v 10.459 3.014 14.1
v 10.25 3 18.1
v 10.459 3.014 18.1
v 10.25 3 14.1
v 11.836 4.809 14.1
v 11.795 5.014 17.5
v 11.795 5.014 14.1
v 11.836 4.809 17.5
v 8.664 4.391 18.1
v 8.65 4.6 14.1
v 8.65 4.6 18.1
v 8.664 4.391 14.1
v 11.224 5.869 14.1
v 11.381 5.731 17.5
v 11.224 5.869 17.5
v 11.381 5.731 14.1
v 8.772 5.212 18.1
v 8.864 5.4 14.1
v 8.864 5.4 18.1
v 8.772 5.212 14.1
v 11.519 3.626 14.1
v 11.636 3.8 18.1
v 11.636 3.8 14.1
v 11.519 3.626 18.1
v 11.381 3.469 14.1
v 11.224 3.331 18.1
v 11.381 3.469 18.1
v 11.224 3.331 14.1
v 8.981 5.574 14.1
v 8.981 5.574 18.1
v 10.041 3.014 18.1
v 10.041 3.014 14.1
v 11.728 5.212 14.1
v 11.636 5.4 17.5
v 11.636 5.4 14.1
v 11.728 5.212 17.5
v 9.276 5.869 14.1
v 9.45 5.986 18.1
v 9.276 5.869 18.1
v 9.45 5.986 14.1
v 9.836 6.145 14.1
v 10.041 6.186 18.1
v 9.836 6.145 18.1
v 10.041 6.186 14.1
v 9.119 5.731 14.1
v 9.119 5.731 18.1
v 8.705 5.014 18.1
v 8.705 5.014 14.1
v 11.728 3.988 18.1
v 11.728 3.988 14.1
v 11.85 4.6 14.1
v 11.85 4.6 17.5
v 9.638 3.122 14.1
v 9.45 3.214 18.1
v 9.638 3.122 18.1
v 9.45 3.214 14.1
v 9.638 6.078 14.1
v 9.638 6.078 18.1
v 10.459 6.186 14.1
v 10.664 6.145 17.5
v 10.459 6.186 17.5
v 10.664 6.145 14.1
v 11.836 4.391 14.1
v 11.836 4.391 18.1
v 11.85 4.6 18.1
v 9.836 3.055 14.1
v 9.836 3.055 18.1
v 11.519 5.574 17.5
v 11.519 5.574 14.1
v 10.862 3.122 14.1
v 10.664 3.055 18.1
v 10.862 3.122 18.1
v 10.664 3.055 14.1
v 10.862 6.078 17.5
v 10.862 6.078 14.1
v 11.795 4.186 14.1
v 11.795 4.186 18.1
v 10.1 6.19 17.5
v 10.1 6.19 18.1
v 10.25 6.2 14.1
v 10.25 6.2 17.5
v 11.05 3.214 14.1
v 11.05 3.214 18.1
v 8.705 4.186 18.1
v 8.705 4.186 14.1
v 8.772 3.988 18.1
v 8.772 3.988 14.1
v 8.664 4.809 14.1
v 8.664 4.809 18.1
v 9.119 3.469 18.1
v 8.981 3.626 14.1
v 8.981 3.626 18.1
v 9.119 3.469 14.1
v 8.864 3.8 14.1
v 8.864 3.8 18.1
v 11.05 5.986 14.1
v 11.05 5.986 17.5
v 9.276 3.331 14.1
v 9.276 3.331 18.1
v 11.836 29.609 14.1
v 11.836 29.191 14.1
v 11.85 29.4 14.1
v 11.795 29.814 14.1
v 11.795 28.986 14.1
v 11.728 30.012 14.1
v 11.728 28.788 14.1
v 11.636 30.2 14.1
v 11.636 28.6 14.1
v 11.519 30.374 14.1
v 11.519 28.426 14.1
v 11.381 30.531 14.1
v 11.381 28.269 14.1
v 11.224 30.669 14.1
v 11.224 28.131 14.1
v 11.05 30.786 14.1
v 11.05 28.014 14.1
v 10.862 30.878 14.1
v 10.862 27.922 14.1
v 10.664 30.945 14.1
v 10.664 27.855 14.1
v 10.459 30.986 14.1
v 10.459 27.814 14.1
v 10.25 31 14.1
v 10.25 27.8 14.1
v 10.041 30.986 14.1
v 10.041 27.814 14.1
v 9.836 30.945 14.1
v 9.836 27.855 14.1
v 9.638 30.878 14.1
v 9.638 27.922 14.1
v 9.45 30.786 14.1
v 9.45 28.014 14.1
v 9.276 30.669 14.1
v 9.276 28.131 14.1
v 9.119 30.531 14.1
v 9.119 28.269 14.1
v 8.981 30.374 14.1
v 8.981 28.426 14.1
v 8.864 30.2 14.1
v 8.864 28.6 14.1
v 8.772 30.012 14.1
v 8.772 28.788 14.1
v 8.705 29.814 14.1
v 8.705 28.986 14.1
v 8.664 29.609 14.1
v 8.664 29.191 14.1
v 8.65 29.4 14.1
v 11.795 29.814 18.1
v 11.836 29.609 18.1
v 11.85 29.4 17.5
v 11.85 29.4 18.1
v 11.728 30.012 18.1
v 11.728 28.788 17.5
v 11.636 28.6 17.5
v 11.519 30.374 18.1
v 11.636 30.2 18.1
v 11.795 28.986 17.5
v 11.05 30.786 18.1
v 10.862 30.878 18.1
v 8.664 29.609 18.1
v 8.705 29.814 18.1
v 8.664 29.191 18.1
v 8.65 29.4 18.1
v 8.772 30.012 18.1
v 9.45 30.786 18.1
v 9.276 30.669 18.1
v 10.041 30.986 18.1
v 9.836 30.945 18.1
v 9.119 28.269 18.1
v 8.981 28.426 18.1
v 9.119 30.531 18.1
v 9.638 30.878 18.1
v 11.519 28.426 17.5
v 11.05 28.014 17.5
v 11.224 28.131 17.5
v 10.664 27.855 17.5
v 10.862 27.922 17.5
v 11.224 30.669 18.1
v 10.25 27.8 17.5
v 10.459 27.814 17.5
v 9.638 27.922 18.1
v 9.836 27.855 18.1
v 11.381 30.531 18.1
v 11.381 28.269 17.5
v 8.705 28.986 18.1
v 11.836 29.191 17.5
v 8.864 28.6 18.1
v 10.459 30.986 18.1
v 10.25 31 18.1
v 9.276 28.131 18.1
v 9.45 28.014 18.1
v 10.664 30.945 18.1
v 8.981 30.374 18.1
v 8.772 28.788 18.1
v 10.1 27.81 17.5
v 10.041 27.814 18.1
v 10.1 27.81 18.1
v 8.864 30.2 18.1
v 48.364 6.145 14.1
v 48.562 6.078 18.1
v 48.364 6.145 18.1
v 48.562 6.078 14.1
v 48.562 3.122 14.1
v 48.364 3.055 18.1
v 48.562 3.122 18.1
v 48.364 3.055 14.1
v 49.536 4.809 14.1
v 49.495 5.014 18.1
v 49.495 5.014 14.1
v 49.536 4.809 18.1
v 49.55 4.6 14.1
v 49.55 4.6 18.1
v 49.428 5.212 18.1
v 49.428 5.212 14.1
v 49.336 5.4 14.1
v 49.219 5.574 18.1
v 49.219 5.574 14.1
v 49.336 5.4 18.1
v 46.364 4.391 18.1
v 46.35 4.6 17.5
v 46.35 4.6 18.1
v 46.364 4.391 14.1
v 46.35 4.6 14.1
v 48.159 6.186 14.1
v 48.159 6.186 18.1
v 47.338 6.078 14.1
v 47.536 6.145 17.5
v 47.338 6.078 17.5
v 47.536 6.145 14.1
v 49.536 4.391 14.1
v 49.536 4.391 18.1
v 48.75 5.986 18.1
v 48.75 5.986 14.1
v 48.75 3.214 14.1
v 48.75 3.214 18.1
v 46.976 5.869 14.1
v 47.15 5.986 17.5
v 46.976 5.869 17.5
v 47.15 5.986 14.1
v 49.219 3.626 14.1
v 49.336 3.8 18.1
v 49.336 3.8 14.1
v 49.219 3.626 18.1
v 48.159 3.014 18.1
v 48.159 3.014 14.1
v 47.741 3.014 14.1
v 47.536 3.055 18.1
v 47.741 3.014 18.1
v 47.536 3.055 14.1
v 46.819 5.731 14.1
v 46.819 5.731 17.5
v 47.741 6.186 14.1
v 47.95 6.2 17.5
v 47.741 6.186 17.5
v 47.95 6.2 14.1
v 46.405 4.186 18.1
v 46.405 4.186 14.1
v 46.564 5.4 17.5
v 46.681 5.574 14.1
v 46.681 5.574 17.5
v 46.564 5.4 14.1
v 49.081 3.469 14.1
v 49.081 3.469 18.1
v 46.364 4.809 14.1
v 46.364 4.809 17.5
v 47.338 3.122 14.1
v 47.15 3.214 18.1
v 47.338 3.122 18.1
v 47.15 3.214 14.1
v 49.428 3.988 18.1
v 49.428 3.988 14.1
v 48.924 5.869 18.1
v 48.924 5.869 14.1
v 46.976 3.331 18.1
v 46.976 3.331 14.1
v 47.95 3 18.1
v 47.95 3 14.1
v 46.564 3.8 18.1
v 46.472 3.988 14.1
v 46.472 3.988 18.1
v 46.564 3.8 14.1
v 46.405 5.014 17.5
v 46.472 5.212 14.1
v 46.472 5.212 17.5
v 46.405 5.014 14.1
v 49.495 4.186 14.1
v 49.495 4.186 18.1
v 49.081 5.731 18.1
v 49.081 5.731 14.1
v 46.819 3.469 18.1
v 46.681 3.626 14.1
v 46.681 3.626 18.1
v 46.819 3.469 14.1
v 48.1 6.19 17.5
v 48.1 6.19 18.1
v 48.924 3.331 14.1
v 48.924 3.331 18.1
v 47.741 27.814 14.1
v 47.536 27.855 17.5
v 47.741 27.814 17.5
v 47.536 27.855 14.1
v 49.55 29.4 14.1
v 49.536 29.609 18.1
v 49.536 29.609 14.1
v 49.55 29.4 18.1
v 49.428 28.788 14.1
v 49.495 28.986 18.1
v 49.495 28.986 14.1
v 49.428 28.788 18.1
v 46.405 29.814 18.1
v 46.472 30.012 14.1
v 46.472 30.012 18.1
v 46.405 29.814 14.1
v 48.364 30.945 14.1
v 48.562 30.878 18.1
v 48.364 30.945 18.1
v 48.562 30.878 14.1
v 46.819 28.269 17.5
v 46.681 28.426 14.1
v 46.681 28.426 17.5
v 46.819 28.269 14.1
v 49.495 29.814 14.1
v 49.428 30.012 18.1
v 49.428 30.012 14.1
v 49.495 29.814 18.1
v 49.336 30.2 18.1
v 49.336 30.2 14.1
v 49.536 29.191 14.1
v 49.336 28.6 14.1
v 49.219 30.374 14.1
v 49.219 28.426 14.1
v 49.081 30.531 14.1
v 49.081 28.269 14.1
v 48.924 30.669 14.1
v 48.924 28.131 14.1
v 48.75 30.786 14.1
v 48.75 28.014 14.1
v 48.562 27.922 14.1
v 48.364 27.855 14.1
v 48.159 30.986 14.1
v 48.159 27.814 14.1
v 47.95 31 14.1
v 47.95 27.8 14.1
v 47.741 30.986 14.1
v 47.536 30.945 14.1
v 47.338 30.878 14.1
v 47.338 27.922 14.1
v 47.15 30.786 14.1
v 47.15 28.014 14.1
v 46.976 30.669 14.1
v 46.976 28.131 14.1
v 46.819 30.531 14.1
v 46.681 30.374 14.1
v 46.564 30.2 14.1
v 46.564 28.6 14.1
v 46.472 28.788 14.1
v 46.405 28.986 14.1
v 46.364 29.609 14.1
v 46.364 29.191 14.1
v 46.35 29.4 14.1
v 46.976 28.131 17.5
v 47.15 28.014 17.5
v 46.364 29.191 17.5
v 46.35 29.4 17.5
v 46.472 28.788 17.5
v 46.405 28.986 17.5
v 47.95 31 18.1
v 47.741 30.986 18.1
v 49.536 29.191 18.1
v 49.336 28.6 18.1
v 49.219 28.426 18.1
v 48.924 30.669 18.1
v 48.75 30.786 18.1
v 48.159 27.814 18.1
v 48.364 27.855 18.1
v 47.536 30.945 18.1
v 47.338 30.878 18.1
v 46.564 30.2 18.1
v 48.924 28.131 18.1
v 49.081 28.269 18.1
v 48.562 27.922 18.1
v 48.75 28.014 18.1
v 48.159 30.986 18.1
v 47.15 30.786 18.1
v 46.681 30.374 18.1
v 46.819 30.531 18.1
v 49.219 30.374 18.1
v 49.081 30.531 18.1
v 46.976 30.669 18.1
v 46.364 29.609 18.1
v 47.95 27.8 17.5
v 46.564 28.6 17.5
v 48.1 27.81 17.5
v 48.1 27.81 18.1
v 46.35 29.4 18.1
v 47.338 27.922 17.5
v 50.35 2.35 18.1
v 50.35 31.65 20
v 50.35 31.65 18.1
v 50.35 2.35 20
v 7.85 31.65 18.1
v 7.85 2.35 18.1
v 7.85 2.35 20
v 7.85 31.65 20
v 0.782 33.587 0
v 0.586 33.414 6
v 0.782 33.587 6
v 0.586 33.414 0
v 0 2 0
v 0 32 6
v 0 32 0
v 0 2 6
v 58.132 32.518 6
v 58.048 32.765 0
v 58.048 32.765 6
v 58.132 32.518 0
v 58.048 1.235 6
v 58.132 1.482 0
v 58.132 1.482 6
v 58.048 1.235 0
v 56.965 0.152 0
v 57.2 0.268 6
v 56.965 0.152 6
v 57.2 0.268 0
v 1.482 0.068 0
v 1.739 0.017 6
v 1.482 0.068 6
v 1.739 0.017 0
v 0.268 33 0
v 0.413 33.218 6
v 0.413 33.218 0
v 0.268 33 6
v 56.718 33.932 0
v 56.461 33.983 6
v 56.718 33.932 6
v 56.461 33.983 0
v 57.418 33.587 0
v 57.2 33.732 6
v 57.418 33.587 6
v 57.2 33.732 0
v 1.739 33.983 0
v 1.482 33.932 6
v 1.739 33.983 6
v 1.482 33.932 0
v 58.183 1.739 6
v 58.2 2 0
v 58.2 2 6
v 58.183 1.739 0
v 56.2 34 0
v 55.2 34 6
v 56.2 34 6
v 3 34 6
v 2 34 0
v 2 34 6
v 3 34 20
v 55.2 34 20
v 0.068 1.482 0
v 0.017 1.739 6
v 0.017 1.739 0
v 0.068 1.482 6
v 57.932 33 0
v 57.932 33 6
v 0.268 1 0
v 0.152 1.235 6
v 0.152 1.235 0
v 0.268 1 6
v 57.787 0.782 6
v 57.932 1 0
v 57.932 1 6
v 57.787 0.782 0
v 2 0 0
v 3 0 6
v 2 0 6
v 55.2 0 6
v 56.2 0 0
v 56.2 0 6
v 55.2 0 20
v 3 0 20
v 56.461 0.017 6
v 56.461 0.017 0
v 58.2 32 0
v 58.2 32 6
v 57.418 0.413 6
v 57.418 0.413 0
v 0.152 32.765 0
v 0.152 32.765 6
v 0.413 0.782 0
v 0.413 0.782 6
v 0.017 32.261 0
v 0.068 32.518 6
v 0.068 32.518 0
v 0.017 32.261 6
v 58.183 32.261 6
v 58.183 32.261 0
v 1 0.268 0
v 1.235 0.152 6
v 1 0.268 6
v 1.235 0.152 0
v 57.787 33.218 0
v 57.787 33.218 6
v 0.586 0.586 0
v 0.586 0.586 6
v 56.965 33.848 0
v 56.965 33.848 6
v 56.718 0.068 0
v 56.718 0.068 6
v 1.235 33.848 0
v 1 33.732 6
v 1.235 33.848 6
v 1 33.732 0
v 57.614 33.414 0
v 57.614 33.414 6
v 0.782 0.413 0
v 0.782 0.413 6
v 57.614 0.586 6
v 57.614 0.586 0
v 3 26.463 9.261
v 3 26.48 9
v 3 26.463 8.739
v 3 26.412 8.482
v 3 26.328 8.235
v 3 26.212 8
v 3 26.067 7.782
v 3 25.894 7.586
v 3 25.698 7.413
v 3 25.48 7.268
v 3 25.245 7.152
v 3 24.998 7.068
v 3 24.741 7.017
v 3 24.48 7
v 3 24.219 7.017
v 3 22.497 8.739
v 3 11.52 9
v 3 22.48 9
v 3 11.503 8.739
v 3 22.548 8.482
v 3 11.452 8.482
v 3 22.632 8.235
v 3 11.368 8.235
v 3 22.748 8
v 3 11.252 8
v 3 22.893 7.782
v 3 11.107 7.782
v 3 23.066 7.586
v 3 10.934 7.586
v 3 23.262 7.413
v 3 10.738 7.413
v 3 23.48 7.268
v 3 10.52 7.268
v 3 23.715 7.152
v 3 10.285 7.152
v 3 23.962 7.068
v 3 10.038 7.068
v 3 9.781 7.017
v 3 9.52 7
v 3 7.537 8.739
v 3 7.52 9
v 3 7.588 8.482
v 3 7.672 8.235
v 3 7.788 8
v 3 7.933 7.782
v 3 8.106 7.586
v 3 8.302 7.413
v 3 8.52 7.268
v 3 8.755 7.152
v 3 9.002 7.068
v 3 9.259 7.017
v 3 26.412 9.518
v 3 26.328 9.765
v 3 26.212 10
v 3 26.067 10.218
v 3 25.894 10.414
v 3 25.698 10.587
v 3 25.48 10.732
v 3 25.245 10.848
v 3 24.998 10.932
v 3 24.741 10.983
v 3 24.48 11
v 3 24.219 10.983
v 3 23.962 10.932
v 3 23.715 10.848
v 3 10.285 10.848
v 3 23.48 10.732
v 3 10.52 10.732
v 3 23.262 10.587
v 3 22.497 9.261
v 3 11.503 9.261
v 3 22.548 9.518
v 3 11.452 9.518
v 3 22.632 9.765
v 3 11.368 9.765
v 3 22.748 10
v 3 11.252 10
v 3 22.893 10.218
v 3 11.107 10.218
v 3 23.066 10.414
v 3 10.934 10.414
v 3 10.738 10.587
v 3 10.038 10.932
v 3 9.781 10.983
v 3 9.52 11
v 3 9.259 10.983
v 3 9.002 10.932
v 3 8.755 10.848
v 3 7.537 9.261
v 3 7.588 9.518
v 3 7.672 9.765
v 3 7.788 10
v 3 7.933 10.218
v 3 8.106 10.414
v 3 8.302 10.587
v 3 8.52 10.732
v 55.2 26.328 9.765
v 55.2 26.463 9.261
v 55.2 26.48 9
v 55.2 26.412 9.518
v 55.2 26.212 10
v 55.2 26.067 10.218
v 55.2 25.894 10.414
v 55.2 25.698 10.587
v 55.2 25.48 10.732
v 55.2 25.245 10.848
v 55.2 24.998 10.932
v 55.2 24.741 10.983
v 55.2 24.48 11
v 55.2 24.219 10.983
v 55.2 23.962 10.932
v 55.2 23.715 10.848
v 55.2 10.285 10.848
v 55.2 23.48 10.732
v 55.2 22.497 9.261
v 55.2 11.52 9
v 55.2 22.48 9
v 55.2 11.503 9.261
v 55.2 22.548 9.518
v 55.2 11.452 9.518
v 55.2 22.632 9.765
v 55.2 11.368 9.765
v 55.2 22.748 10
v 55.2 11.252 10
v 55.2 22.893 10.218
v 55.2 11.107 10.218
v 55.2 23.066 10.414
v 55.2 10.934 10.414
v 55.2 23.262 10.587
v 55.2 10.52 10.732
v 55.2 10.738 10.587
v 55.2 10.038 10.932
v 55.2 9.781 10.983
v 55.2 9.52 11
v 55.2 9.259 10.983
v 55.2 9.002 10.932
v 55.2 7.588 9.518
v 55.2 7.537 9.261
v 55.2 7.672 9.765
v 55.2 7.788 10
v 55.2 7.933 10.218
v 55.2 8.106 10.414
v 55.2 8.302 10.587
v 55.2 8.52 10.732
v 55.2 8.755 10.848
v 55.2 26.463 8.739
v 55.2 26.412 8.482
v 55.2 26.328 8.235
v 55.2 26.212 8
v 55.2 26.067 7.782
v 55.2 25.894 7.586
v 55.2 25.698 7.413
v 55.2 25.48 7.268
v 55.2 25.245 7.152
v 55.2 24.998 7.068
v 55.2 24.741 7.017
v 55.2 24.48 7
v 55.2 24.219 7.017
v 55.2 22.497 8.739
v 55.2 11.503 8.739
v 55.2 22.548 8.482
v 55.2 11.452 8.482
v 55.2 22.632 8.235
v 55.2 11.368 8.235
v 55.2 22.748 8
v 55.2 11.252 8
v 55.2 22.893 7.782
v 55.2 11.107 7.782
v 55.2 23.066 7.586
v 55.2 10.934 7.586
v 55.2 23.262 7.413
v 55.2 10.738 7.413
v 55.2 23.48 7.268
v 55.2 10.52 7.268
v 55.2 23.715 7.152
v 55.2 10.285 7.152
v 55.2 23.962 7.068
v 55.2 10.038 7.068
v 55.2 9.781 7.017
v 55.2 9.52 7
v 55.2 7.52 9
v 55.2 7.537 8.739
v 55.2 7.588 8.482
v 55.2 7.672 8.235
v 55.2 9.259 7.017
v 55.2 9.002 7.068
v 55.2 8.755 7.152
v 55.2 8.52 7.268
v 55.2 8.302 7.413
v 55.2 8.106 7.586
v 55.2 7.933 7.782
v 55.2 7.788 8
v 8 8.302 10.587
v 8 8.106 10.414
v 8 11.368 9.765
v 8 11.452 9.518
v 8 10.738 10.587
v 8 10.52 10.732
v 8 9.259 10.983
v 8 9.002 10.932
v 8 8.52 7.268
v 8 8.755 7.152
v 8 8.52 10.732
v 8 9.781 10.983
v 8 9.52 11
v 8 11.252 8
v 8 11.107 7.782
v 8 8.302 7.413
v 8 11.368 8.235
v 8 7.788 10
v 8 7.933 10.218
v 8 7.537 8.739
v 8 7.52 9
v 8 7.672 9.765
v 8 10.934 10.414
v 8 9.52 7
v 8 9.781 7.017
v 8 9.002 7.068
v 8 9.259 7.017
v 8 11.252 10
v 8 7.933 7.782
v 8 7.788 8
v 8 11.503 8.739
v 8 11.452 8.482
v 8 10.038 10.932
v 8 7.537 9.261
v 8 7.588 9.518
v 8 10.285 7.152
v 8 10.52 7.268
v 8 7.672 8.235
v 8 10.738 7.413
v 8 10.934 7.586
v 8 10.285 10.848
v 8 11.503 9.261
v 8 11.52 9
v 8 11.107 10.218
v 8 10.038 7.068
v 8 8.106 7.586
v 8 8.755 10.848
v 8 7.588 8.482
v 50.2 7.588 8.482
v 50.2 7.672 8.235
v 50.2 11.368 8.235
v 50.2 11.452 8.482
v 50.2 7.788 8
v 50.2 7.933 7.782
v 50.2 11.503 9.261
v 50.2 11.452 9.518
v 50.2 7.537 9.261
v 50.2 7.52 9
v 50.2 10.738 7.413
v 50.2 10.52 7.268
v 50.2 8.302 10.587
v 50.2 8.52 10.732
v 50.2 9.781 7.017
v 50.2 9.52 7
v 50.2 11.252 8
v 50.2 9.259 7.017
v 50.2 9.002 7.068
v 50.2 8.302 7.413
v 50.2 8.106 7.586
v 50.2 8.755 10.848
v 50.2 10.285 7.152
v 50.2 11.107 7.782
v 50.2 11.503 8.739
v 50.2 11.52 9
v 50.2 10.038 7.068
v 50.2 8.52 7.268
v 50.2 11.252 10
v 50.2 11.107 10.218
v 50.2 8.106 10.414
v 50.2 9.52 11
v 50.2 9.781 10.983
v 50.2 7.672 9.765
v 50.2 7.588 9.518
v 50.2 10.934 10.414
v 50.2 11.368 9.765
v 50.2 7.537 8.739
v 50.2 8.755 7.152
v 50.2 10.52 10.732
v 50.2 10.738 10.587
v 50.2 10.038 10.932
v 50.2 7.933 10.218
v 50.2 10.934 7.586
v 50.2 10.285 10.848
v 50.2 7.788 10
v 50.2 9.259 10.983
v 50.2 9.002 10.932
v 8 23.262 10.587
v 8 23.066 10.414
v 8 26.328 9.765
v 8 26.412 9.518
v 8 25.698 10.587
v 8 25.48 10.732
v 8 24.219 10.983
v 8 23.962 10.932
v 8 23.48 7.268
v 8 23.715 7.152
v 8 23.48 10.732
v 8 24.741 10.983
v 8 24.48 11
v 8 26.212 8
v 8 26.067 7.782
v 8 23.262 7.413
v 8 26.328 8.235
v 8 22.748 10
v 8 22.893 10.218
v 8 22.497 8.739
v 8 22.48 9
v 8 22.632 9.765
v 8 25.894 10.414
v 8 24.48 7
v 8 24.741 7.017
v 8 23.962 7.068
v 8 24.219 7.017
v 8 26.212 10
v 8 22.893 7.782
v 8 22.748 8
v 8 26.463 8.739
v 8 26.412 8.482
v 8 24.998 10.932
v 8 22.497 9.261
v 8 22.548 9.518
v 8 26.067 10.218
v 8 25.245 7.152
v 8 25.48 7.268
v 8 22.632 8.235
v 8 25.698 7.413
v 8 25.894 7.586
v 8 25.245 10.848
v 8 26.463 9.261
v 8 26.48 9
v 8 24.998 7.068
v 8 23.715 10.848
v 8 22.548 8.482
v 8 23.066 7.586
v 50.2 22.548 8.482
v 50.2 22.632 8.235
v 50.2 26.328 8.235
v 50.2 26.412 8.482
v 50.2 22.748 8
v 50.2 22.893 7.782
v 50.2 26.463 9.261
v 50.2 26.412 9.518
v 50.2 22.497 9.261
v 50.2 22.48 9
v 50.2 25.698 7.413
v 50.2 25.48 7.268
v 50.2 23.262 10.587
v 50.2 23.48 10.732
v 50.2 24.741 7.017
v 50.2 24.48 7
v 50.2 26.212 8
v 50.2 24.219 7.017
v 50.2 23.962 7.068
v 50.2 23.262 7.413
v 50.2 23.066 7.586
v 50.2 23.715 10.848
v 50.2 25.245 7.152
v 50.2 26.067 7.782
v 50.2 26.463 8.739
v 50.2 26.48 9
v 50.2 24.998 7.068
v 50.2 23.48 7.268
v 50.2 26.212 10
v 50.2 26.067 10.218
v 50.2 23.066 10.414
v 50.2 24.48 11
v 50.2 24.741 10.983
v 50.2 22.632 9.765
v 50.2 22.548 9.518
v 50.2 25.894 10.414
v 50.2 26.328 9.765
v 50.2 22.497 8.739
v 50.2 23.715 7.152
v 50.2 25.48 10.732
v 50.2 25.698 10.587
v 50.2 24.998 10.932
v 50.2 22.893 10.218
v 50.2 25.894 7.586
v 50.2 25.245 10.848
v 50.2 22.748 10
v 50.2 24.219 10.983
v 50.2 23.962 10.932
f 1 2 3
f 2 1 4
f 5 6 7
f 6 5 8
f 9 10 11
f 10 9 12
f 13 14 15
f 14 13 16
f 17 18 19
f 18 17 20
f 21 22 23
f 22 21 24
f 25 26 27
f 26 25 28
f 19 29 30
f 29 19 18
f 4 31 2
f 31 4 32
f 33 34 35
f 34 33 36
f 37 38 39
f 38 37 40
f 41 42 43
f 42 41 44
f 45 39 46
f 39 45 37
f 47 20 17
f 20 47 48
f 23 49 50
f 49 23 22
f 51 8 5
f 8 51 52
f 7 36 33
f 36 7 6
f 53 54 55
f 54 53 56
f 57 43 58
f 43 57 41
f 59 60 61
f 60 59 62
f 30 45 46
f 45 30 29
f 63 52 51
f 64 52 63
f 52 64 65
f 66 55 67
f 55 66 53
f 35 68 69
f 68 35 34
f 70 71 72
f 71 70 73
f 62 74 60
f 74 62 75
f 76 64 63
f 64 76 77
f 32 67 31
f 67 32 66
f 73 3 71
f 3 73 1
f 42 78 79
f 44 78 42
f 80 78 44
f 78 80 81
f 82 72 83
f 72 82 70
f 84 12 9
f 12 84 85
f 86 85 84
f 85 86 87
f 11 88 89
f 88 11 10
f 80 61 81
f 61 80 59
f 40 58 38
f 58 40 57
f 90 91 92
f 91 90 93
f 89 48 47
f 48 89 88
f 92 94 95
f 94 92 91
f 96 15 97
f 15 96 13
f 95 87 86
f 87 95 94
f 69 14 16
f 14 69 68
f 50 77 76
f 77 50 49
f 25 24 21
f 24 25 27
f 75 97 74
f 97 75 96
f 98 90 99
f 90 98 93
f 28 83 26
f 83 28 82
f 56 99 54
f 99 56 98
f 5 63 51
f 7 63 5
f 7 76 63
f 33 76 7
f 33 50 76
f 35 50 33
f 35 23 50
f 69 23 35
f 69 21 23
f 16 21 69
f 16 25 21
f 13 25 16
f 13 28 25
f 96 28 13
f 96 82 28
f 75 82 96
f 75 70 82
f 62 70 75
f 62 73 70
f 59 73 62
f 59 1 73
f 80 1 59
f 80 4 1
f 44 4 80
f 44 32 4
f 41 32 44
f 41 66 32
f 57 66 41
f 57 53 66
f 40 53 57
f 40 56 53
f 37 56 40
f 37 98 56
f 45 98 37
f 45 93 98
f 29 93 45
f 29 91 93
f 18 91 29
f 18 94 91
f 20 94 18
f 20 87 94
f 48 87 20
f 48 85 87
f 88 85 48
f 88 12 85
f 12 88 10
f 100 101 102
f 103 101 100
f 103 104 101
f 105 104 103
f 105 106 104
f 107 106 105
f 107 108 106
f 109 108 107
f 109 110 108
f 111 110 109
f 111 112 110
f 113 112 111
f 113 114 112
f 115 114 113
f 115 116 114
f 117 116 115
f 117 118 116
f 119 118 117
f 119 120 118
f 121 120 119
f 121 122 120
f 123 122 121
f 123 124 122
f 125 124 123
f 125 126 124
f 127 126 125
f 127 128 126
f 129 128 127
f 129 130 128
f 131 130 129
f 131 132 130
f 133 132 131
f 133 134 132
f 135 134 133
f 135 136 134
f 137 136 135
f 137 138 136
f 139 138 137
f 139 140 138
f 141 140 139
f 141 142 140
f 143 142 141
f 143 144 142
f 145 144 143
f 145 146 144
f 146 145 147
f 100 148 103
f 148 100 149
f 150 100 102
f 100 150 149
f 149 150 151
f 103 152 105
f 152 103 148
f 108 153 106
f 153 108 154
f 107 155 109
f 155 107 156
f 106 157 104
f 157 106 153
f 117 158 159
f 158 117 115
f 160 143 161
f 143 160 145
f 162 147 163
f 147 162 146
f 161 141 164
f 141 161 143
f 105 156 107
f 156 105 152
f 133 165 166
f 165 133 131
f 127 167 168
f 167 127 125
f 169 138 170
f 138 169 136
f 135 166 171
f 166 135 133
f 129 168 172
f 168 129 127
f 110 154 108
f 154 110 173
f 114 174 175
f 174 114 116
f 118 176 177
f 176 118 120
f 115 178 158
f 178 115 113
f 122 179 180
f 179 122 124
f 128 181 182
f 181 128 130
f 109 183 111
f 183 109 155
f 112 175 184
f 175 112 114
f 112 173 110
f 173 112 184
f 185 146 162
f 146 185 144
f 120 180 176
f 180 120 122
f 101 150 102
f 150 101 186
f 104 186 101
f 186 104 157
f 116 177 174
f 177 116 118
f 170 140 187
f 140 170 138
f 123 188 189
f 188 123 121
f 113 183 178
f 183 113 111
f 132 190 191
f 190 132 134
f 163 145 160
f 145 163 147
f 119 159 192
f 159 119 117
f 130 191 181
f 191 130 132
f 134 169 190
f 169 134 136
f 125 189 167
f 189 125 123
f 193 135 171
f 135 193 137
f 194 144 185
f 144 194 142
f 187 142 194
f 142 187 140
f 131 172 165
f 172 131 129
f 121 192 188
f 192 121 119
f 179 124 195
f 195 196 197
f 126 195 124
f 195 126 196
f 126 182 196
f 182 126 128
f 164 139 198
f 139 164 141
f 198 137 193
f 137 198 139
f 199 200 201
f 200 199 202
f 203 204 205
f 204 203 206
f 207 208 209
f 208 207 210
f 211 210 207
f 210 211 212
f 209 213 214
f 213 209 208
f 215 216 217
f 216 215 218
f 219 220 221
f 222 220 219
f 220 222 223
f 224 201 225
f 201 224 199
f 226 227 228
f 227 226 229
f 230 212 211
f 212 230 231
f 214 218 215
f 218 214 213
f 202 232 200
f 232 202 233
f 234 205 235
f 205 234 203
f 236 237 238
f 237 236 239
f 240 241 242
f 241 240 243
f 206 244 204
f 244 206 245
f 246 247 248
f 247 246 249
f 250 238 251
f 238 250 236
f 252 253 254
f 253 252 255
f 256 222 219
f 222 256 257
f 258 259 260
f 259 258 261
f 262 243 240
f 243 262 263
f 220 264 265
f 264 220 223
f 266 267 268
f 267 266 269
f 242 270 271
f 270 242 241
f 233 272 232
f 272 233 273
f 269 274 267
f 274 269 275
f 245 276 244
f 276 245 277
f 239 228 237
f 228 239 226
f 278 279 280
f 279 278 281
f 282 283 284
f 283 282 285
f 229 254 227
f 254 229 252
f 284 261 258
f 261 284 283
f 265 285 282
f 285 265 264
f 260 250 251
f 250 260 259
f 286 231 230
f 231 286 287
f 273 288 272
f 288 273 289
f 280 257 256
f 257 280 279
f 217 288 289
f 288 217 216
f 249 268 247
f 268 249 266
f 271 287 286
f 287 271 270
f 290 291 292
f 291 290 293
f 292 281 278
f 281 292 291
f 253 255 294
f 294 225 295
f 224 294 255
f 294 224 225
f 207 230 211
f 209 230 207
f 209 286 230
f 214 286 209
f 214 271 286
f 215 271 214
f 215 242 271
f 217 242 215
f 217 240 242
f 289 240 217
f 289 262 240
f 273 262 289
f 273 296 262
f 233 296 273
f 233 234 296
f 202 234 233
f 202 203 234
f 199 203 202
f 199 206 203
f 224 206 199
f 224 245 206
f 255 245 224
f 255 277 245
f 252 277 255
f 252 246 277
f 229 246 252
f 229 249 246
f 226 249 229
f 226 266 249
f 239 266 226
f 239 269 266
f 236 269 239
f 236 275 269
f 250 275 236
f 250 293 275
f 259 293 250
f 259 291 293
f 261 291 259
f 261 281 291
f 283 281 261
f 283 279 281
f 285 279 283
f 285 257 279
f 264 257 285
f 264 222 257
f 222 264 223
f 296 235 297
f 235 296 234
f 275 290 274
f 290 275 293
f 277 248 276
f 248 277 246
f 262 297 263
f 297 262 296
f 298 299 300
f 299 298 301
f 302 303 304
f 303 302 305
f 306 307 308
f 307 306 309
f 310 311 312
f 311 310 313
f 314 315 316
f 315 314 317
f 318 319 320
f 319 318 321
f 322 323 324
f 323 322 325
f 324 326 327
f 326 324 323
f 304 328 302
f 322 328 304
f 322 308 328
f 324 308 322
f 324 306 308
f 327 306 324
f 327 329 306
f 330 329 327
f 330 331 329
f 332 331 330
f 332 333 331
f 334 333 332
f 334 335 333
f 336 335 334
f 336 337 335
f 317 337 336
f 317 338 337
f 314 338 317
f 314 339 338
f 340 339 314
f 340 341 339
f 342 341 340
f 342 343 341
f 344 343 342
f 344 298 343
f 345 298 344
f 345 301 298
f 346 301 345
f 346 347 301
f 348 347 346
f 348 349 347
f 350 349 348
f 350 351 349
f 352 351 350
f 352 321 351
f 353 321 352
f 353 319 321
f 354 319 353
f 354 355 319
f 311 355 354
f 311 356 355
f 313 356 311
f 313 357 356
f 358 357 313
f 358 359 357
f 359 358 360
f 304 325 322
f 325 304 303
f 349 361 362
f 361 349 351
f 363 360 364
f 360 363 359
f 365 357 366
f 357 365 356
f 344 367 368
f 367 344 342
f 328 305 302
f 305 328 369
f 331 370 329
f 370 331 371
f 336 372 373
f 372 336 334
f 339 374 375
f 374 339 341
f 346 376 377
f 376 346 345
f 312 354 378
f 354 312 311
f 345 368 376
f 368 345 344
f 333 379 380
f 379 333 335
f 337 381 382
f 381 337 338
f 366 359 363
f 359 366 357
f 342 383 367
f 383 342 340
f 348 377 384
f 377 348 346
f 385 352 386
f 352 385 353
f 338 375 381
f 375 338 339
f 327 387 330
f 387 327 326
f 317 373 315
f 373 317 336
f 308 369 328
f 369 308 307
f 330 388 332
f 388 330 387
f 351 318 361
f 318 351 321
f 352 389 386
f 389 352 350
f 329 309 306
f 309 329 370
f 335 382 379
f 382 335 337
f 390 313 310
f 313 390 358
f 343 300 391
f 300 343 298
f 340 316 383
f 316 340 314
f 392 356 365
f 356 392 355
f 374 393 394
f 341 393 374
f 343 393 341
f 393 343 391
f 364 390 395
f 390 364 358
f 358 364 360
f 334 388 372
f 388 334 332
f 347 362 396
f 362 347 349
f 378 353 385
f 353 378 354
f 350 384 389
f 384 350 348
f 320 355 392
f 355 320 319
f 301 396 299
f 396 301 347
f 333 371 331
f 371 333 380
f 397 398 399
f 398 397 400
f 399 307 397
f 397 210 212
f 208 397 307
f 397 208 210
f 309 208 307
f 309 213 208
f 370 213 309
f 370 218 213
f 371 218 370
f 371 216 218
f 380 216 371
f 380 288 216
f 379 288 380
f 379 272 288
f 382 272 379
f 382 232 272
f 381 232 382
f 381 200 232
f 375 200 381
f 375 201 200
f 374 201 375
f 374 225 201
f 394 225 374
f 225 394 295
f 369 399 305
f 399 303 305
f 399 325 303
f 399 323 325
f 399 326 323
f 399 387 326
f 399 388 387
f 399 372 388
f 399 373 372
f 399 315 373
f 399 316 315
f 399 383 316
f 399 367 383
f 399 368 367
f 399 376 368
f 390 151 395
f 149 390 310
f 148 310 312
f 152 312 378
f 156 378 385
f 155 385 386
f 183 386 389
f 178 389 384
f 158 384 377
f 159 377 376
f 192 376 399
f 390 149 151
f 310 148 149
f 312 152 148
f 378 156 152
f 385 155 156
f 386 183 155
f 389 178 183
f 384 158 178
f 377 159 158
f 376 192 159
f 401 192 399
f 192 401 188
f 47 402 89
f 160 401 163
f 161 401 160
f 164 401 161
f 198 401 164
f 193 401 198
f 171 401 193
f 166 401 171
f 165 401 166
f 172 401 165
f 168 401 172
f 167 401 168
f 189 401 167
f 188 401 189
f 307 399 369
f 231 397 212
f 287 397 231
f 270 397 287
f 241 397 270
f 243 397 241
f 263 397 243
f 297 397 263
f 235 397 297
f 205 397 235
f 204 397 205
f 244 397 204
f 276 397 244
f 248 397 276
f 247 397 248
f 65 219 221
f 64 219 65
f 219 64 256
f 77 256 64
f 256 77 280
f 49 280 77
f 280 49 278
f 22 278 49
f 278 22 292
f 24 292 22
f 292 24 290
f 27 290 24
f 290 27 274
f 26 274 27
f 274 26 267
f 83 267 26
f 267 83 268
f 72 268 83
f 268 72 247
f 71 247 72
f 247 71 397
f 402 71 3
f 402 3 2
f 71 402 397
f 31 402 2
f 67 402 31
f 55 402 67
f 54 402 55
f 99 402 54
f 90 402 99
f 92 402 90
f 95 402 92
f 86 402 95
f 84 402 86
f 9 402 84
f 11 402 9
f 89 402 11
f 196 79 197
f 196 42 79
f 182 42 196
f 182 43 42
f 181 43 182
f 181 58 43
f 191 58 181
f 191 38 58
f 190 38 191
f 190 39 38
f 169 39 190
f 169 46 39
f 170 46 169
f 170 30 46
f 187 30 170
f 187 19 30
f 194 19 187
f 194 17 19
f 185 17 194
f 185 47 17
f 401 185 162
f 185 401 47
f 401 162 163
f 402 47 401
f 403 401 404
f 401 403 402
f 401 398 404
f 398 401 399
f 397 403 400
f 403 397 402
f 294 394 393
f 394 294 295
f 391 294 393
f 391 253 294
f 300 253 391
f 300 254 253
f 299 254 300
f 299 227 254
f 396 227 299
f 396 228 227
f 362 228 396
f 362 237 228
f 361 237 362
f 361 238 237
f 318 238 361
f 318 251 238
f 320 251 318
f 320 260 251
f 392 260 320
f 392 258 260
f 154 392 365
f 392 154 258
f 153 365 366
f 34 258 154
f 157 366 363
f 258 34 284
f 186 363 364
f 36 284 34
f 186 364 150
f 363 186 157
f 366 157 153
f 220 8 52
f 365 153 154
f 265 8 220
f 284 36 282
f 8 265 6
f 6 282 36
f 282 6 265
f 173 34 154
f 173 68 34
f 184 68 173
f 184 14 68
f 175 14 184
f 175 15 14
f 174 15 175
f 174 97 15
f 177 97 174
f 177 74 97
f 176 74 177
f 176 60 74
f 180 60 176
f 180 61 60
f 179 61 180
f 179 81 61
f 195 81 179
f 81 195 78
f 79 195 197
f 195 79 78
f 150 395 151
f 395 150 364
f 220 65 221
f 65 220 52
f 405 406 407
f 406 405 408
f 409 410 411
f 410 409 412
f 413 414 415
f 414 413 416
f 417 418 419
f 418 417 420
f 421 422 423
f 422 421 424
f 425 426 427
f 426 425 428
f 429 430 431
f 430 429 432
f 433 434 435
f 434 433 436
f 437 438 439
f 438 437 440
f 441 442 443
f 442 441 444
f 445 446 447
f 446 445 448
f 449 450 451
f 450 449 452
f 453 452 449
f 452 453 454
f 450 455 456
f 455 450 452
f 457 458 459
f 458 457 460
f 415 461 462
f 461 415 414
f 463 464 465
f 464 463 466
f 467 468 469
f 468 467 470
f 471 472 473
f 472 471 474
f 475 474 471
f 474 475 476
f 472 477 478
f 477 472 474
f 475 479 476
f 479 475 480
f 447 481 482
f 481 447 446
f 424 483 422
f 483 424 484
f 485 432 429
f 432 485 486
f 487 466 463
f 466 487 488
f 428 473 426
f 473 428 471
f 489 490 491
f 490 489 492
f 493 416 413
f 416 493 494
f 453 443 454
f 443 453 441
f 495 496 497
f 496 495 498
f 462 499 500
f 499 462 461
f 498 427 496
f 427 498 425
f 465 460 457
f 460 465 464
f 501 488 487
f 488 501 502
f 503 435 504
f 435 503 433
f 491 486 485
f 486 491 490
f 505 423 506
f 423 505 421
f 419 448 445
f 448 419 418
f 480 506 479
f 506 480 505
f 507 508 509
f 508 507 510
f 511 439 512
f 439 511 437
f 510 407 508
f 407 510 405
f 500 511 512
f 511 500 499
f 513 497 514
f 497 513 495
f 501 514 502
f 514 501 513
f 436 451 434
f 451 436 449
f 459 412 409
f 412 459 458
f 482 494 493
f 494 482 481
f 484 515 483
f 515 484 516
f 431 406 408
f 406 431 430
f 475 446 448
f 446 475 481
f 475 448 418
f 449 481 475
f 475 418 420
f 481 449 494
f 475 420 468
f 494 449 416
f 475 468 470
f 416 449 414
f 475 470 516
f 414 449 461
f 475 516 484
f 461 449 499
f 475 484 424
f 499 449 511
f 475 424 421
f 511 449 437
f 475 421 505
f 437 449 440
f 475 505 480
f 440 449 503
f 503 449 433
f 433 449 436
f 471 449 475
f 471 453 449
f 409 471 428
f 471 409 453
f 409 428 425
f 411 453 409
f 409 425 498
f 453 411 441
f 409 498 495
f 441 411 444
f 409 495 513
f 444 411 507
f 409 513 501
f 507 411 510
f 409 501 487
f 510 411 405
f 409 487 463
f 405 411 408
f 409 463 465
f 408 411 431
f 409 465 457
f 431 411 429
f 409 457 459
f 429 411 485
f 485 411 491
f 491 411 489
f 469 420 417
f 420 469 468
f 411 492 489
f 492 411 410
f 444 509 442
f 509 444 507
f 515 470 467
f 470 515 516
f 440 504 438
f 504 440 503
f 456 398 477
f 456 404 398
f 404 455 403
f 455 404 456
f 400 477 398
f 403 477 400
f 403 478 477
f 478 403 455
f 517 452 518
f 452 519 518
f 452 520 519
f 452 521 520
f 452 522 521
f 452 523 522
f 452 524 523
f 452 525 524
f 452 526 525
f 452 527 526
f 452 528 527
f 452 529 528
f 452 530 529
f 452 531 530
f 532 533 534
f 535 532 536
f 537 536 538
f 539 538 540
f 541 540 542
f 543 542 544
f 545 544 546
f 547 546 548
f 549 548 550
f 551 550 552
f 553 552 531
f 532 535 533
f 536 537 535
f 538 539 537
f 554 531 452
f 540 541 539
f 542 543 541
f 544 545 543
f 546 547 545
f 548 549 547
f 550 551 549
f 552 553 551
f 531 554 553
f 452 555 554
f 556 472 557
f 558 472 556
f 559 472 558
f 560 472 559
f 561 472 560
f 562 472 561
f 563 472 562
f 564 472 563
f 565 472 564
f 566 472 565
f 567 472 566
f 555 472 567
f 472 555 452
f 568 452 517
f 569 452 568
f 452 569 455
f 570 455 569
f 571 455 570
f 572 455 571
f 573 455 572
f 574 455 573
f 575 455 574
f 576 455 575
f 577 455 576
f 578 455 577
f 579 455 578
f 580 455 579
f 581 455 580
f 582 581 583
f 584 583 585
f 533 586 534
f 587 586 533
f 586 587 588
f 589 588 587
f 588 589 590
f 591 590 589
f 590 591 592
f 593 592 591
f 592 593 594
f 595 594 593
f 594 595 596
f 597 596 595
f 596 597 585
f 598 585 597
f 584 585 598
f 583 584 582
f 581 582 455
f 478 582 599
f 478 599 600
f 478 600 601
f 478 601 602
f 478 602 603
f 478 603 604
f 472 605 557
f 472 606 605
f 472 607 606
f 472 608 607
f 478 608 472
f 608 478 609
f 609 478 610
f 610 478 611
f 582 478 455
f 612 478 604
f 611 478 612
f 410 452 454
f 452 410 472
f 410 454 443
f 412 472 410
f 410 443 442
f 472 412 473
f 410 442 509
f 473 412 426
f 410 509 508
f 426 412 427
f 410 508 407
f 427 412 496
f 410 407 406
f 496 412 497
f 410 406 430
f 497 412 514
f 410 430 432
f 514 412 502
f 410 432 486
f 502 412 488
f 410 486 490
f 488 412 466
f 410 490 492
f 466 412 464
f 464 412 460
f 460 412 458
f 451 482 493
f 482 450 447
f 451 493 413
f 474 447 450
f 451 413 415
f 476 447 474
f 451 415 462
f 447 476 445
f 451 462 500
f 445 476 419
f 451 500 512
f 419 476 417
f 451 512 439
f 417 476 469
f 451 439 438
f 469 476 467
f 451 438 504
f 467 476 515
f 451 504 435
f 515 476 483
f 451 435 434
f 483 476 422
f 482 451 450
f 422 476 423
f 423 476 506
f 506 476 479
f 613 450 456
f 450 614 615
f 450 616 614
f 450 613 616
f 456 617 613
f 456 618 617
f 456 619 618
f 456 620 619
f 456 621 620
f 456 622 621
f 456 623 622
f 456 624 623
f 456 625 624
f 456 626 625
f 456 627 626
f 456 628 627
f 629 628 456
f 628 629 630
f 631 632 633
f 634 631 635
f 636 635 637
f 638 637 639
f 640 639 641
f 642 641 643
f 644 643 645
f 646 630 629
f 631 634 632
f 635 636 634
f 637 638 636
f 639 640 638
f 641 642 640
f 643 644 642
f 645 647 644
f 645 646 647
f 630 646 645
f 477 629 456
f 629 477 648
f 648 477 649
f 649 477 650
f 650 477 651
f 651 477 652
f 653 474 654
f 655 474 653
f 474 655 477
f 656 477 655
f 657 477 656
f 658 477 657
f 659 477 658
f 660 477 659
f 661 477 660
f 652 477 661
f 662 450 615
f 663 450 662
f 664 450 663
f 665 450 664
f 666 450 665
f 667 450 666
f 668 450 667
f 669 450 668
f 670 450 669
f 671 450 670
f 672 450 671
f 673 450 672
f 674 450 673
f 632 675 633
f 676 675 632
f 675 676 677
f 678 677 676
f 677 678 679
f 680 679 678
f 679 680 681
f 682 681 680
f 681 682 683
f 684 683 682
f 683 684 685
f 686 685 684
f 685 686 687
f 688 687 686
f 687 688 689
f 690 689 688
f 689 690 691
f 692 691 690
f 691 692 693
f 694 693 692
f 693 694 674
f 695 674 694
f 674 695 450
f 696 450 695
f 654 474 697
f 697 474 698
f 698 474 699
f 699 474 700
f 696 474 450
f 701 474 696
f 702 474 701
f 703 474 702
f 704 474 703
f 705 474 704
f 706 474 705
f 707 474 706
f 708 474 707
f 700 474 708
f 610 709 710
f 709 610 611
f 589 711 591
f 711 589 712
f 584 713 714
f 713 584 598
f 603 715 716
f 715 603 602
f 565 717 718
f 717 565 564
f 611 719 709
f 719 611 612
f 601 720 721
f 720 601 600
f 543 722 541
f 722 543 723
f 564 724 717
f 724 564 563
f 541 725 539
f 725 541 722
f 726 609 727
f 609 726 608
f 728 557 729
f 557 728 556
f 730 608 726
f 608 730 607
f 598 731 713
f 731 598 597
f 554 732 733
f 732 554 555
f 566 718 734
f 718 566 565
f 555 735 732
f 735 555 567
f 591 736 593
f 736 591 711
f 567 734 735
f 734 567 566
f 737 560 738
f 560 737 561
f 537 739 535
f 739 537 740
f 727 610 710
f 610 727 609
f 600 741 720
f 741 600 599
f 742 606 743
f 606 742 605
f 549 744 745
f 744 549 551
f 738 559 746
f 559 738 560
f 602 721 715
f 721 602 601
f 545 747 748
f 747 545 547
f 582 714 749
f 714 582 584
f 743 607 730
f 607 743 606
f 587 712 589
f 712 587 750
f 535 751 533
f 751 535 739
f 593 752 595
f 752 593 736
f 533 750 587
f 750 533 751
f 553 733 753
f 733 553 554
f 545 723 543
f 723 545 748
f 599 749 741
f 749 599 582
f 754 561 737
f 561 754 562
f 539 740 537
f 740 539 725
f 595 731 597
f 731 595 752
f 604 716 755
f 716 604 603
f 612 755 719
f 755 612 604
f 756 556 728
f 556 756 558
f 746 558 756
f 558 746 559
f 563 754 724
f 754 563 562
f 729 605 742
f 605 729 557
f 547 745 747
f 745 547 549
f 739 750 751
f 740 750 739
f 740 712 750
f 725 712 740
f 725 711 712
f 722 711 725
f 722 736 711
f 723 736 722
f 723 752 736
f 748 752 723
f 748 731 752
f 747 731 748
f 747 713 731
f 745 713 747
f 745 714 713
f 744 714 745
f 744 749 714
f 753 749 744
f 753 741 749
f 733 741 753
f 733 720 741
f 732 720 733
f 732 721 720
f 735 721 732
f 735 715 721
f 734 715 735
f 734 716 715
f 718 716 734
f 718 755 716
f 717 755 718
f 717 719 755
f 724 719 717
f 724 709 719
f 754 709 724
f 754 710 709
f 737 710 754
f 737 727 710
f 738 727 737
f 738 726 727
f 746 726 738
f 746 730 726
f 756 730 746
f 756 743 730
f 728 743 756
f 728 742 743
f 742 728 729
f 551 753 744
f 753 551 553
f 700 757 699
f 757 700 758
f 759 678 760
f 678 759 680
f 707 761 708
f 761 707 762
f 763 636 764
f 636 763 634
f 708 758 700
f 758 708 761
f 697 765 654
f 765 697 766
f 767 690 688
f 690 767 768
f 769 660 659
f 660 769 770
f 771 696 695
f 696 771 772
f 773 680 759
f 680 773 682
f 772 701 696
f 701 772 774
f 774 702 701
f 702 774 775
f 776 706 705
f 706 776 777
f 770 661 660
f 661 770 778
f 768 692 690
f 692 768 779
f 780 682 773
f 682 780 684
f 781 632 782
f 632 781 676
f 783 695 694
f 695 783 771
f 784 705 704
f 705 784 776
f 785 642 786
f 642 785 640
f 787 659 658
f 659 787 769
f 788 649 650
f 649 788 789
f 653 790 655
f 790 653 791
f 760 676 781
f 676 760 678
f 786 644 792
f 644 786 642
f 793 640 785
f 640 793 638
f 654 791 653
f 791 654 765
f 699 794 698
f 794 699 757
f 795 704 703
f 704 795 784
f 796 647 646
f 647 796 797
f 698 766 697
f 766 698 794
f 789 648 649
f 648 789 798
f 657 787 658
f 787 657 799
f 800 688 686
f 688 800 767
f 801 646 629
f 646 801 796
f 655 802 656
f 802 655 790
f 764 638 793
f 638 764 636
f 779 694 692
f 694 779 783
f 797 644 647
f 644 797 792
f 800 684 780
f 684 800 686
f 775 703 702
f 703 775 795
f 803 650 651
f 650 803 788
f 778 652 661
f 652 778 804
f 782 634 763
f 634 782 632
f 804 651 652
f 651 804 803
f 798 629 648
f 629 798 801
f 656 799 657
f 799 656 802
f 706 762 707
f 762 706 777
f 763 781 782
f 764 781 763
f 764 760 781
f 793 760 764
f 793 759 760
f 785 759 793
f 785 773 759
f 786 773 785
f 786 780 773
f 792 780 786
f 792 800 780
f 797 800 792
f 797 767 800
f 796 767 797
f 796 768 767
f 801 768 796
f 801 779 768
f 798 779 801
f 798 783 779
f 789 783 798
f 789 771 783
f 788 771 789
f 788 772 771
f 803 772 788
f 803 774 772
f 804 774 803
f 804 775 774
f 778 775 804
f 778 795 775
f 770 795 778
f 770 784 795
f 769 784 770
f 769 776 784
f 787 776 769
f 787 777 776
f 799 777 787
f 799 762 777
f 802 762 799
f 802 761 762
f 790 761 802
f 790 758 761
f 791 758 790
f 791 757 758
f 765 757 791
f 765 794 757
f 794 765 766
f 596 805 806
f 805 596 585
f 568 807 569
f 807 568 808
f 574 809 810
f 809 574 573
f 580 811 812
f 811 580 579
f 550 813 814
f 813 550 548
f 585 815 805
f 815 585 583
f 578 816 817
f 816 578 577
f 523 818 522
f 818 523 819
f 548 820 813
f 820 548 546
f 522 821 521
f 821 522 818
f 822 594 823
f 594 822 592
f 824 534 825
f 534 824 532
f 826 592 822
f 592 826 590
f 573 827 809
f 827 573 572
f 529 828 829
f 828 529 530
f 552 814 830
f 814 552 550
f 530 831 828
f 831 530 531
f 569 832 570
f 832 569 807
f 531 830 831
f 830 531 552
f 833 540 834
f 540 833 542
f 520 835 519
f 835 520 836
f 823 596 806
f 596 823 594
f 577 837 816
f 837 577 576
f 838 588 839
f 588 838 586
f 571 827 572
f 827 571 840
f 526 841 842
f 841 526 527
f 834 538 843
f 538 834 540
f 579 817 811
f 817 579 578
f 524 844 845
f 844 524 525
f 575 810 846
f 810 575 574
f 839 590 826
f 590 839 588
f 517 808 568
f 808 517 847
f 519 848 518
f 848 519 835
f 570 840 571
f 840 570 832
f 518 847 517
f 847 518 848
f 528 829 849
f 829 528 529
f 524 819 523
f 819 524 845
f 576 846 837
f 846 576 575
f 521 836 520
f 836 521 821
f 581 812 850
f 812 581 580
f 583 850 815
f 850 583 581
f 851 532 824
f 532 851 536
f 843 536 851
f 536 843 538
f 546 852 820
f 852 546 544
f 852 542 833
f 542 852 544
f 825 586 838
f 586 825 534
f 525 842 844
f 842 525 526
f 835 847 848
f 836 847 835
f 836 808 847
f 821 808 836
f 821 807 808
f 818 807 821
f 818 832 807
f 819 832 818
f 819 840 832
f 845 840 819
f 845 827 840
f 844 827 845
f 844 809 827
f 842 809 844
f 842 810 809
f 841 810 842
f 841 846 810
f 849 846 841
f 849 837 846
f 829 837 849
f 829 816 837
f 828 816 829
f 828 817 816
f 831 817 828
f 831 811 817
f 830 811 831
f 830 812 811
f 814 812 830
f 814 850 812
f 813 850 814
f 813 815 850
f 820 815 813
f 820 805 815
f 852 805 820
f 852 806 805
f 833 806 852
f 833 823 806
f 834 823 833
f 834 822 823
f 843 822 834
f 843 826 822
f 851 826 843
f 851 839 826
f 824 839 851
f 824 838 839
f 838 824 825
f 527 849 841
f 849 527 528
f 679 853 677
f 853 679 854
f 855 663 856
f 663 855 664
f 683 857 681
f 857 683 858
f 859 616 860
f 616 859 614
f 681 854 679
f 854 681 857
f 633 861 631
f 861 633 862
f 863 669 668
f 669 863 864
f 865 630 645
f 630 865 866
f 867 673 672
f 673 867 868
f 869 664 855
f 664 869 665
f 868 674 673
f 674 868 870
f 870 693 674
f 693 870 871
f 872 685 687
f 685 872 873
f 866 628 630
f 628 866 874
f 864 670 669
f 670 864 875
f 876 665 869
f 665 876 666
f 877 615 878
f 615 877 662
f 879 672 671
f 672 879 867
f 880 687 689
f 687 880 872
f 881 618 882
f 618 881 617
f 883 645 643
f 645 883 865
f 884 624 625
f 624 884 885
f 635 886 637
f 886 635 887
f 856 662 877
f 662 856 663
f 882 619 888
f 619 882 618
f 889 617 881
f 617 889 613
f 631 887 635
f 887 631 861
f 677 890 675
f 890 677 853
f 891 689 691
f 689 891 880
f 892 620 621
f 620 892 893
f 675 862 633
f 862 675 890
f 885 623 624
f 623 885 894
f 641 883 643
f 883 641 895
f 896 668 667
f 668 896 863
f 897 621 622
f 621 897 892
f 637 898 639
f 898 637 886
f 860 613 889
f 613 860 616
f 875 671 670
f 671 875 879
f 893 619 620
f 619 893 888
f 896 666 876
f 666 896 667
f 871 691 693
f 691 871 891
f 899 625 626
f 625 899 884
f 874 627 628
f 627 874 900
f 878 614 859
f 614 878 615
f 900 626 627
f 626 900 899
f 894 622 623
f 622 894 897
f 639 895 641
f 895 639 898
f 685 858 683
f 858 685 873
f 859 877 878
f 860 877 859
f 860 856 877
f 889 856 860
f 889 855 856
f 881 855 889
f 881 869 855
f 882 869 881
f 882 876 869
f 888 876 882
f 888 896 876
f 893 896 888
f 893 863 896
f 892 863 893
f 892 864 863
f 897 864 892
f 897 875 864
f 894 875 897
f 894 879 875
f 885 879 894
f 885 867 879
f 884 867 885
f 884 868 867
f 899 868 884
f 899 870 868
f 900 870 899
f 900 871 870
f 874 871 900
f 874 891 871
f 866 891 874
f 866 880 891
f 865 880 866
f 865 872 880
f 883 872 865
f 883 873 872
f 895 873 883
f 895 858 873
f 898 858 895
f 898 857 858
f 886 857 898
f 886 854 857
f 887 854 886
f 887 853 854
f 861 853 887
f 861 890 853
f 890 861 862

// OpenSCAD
// file: screw_mounts.scad
// ============================================================
// Screw mounts — reusable brass-insert + screw-hole cutters
//
// Two negative-geometry modules, meant to be subtracted (difference())
// from a part.  They are the matched halves of one fastened joint:
//
//   insert_hole(size)        bore for a brass heat-set insert, pressed
//                            into the part that the screw threads INTO.
//   screw_hole(size, length) clearance hole in the COMPLEMENTARY part the
//                            screw passes THROUGH — exact screw-body bore
//                            that tapers out (countersink) into the head.
//
// `size` is "M2" or "M3".  Dimensions for the inserts match those already
// used in sight_housing.scad (M2: ø3.20 × 4.0; M3: ø4.00 × 5.0).
//
// Orientation convention (both modules):
//   The mouth of the hole sits at the LOCAL ORIGIN on the Z=0 plane and
//   the hole bores DOWNWARD into -Z, i.e. the fastener is imagined entering
//   from +Z.  Each cutter pokes +0.1 mm past Z=0 so the Boolean cleanly
//   breaks the surface.  translate()/rotate() the call to place it on the
//   real face, exactly like the bores in sight_housing.scad.
//
//   insert_hole : insert is pressed in from +Z; bore is +Z-deep into stock.
//   screw_hole  : head sits flush at Z=0 (countersunk), body bores to -Z.
// ============================================================

// ── Fastener table ───────────────────────────────────────────
// One row per screw size.  Head thickness is the user-specified value
// (M3 = 1.75 mm, M2 = 1.50 mm); head diameter is the user-specified
// countersunk flat-head OD (M3 = 5.8, M2 = 4.0).  Body diameter is the
// nominal thread OD — the screw hole uses this EXACTLY (see screw_hole()).
function screw_body_d(size) =
  size == "M3" ? 3.00 :
  size == "M2" ? 2.00 : undef;

function screw_head_d(size) =
  size == "M3" ? 5.80 :
  size == "M2" ? 4.00 : undef;

function screw_head_t(size) =
  size == "M3" ? 1.75 :
  size == "M2" ? 1.50 : undef;

// Brass heat-set insert bore (outer dia + length) — values shared with
// sight_housing.scad's insert_d / insert_depth (M2) and join_insert_d /
// join_insert_depth (M3).
function insert_bore_d(size) =
  size == "M3" ? 4.00 :
  size == "M2" ? 3.20 : undef;

function insert_bore_depth(size) =
  size == "M3" ? 5.00 :
  size == "M2" ? 4.00 : undef;

// ── Brass-insert bore ────────────────────────────────────────
// Pocket for a heat-set insert, pressed in from +Z.  Bores `depth` into
// -Z (default = the size's standard insert length) and pokes 0.1 mm past
// the Z=0 face so the cut breaks the surface cleanly.
//   depth : override the bore depth (mm).  Leave default for the standard
//           insert length.
module insert_hole(size, depth = undef) {
  d = insert_bore_d(size);
  h = depth == undef ? insert_bore_depth(size) : depth;
  translate([0, 0, -h])
    cylinder(d = d, h = h + 0.1);
}

// ── Screw clearance hole + head countersink ──────────────────
// Cut in the complementary part the screw passes THROUGH.  The straight
// bore is EXACTLY the screw-body diameter (plus optional `clearance`,
// default 0 — a true body-diameter hole as requested); the top
// screw_head_t(size) mm flares out as a cone from the body diameter up to
// the full head diameter, so a countersunk head seats flush at Z=0.
//   length    : straight body-bore length below the taper (mm).  Set to
//               the wall/material thickness the screw shank crosses; the
//               taper sits on top of this, the bore pokes 0.1 mm past the
//               far side for a clean break.
//   clearance : added to the body diameter (mm).  Default 0 = exact body
//               diameter.  Use e.g. 0.4 for a free-fit clearance hole.
module screw_hole(size, length, clearance = 0) {
  bd = screw_body_d(size) + clearance; // straight bore = exact body dia (+fit)
  hd = screw_head_d(size);             // countersink mouth = head dia
  ht = screw_head_t(size);             // taper height = head thickness

  union() {
    // straight body-clearance bore, hanging below the taper
    translate([0, 0, -(length + ht)])
      cylinder(d = bd, h = length + 0.1);
    // head countersink: cone flaring from body dia up to head dia
    translate([0, 0, -ht])
      cylinder(d1 = bd, d2 = hd, h = ht);
    // break the top surface above the head mouth
    translate([0, 0, -0.001])
      cylinder(d = hd, h = 0.1);
  }
}

// ── Straight clearance bore (no head) ────────────────────────
// Plain body-clearance hole the screw shank passes through (e.g. a bolt
// crossing a skirt/wall).  Mouth at Z=0, bores `length` into −Z with a +0.1 mm
// overshoot at the mouth to break the surface.
//   length : material thickness the shank crosses.
//   clear  : added to the screw-body diameter (default 0).
module clearance_hole(size, length, clear = 0) {
  translate([0, 0, -length])
    cylinder(d = screw_body_d(size) + clear, h = length + 0.1);
}

// ── Clearance bore + cylindrical socket-head counterbore ─────
// For a socket-head cap screw seated below a surface: a straight shank
// clearance bore through `length`, plus a flat-bottomed cylindrical recess
// (head_d × head_h) at the mouth.  Mouth at Z=0, bores into −Z, +0.1 mm
// overshoot on both bores.  head_d/head_h default to the size's flat-head
// table values; override for socket heads.
//   length : full thickness the shank crosses (the plate/lid).
//   clear  : added to the screw-body diameter for the shank (default 0).
module counterbore_hole(size, length, clear = 0, head_d = undef, head_h = undef) {
  hd = head_d == undef ? screw_head_d(size) : head_d;
  hh = head_h == undef ? screw_head_t(size) : head_h;
  union() {
    // shank clearance bore through the full length (+0.1 both ends)
    translate([0, 0, -(length + 0.1)])
      cylinder(d = screw_body_d(size) + clear, h = length + 0.2);
    // cylindrical head recess at the mouth
    translate([0, 0, -hh])
      cylinder(d = hd, h = hh + 0.1);
  }
}

// ── Demo (only renders when this file is opened directly; `use <>`
// imports the modules/functions above and ignores everything below) ──
$fn = 48;
demo_block = 14;
// left: a block with an M3 insert bore;  right: a block with an M3 screw
// hole, sliced so the countersink + body bore are visible.
difference() {
  translate([-demo_block - 2, -demo_block / 2, -demo_block])
    cube([demo_block, demo_block, demo_block]);
  insert_hole("M3");
}
difference() {
  translate([2, -demo_block / 2, -demo_block])
    cube([demo_block, demo_block, demo_block]);
  translate([2 + demo_block / 2, 0, 0])
    screw_hole("M3", demo_block - 4);
}
// main file
// ============================================================
// Screen body — optics-head display holder + side lap joint
//
// The bottom part's core: a rounded box holding the OLED PCB in a top
// pocket (display faces +Z), the rebates/inserts/clearances for the
// horizontal M3 lap-joint screws, and the generic rounded_box helper.
//
//   screen_body(...)     the display housing block (PCB pocket, active-area
//                        window, M2 heat-set bores below the pocket).
//   side_rebates(...)    cuts the bottom part's outer side faces so the top
//                        part's skirts sit flush (negative geometry).
//   joint_inserts(...)   M3 heat-set bores in the thick side edges (cutter).
//   joint_clearance(...) M3 through-clearance in the top-part skirts (cutter).
//   rounded_box(...)     generic rounded-corner box (union primitive).
//
// Shared/derived dims (body_w, body_d, …) are passed in; display and
// fastener specifics are file-level intrinsics.  Fastener bores come from
// screw_mounts.scad so diameters/depths stay consistent project-wide.
// ============================================================
use <screw_mounts.scad>

// ── Display intrinsics — Waveshare 1.27" SSD1351 RGB OLED ────
disp_pcb      = [42.20, 29.00, 1.60]; // PCB w, h, t
disp_active   = [38.00, 24.80];       // lit window w, h
disp_hole_off = [2.25, 2.10];         // mount-hole inset from PCB edge (x, y)
function disp_pcb_w() = disp_pcb[0];
function disp_pcb_h() = disp_pcb[1];
function disp_pcb_t() = disp_pcb[2];

// Generic rounded-corner box: hull of 4 corner cylinders.
module rounded_box(w, d, h, r = 2) {
  hull()for (x = [r, w - r], y = [r, d - r])
    translate([x, y, 0]) cylinder(r=r, h=h);
}

// ── Screen body ──────────────────────────────────────────────
// Optics-only housing: OLED PCB sits in a top pocket; all other
// electronics live in the separate forward box.  Display faces UP (+Z);
// Y=0 = rear, Y=body_d = front.
//
// hold_display : when true (default) the flat top pocket, active-area window
//   and M2 bores are cut for a display lying in the body floor.  Set false to
//   get a solid-topped body — used when the display is mounted elsewhere
//   (e.g. the tilted oled_mount() in the optics head).
module screen_body(body_w, body_d, body_height, side_edge, wall, clearance,
                   hold_display = true) {
  difference() {
    rounded_box(body_w, body_d, body_height);

    if (hold_display) {
    // PCB pocket — clearance/2 on every side so PCB drops in freely
    translate(
      [
        side_edge - clearance / 2,
        wall - clearance / 2,
        body_height - disp_pcb_t() - clearance,
      ]
    )
      cube(
        [
          disp_pcb_w() + clearance,
          disp_pcb_h() + clearance,
          disp_pcb_t() + clearance + 0.1,
        ]
      );

    // Active-area window in top face
    translate(
      [
        side_edge + (disp_pcb_w() - disp_active[0]) / 2,
        wall + (disp_pcb_h() - disp_active[1]) / 2,
        body_height - wall,
      ]
    )
      cube([disp_active[0], disp_active[1], wall + 0.2]);

    // PCB mount: M2 heat-set insert bores below the PCB pocket floor.
    // Screws drop through the PCB corner holes from above and thread into
    // brass inserts pressed up into these bores.
    for (sx = [-1, 1], sy = [-1, 1])
      translate(
        [
          side_edge + disp_pcb_w() / 2 + sx * (disp_pcb_w() / 2 - disp_hole_off[0]),
          wall + disp_pcb_h() / 2 + sy * (disp_pcb_h() / 2 - disp_hole_off[1]),
          body_height - disp_pcb_t() - clearance,
        ]
      )
        insert_hole("M2");
    }

    // Cable exits FORWARD now (see cable_channel()); no rear slot.
  }
}

// ── Side lap joint ───────────────────────────────────────────
// The top-part skirts lap over rebates in the bottom-part side edges; 4
// horizontal M3 screws (2 per side, low — under the PCB) pin and clamp them.

// Rebate the bottom part's outer side faces so the skirts sit flush.
module side_rebates(body_w, body_d, body_height, skirt_t, lap_h) {
  translate([-0.1, -0.1, body_height - lap_h])
    cube([skirt_t + 0.1, body_d + 0.2, lap_h + 0.2]);
  translate([body_w - skirt_t, -0.1, body_height - lap_h])
    cube([skirt_t + 0.1, body_d + 0.2, lap_h + 0.2]);
}

// M3 brass-insert bores in the thick bottom side edges (open at the rebate
// face), low and in solid material below the PCB.
module joint_inserts(body_w, side_screw_y, skirt_t, joint_screw_z = 9.0) {
  for (y = side_screw_y) {
    translate([skirt_t, y, joint_screw_z]) // left edge, bore +X
      rotate([0, -90, 0]) insert_hole("M3");
    translate([body_w - skirt_t, y, joint_screw_z]) // right edge, bore -X
      rotate([0, 90, 0]) insert_hole("M3");
  }
}

// M3 clearance holes through the top-part skirts.
module joint_clearance(body_w, side_screw_y, skirt_t, joint_screw_z = 9.0) {
  for (y = side_screw_y) {
    translate([-0.1, y, joint_screw_z])
      rotate([0, -90, 0]) clearance_hole("M3", skirt_t + 0.2, 0.4);
    translate([body_w + 0.1, y, joint_screw_z])
      rotate([0, 90, 0]) clearance_hole("M3", skirt_t + 0.2, 0.4);
  }
}

// ── Demo (renders only when this file is opened directly) ────
$fn = 48;
_body_w = disp_pcb_w() + 2 * 8.00;   // side_edge = 8
_body_d = disp_pcb_h() + 2 * 2.50;   // wall = 2.5
_ssy = [_body_d * 0.28, _body_d * 0.72];
difference() {
  screen_body(_body_w, _body_d, 20.00, 8.00, 2.50, 0.30);
  side_rebates(_body_w, _body_d, 20.00, 3.00, 14.00);
  joint_inserts(_body_w, _ssy, 3.00);
}
